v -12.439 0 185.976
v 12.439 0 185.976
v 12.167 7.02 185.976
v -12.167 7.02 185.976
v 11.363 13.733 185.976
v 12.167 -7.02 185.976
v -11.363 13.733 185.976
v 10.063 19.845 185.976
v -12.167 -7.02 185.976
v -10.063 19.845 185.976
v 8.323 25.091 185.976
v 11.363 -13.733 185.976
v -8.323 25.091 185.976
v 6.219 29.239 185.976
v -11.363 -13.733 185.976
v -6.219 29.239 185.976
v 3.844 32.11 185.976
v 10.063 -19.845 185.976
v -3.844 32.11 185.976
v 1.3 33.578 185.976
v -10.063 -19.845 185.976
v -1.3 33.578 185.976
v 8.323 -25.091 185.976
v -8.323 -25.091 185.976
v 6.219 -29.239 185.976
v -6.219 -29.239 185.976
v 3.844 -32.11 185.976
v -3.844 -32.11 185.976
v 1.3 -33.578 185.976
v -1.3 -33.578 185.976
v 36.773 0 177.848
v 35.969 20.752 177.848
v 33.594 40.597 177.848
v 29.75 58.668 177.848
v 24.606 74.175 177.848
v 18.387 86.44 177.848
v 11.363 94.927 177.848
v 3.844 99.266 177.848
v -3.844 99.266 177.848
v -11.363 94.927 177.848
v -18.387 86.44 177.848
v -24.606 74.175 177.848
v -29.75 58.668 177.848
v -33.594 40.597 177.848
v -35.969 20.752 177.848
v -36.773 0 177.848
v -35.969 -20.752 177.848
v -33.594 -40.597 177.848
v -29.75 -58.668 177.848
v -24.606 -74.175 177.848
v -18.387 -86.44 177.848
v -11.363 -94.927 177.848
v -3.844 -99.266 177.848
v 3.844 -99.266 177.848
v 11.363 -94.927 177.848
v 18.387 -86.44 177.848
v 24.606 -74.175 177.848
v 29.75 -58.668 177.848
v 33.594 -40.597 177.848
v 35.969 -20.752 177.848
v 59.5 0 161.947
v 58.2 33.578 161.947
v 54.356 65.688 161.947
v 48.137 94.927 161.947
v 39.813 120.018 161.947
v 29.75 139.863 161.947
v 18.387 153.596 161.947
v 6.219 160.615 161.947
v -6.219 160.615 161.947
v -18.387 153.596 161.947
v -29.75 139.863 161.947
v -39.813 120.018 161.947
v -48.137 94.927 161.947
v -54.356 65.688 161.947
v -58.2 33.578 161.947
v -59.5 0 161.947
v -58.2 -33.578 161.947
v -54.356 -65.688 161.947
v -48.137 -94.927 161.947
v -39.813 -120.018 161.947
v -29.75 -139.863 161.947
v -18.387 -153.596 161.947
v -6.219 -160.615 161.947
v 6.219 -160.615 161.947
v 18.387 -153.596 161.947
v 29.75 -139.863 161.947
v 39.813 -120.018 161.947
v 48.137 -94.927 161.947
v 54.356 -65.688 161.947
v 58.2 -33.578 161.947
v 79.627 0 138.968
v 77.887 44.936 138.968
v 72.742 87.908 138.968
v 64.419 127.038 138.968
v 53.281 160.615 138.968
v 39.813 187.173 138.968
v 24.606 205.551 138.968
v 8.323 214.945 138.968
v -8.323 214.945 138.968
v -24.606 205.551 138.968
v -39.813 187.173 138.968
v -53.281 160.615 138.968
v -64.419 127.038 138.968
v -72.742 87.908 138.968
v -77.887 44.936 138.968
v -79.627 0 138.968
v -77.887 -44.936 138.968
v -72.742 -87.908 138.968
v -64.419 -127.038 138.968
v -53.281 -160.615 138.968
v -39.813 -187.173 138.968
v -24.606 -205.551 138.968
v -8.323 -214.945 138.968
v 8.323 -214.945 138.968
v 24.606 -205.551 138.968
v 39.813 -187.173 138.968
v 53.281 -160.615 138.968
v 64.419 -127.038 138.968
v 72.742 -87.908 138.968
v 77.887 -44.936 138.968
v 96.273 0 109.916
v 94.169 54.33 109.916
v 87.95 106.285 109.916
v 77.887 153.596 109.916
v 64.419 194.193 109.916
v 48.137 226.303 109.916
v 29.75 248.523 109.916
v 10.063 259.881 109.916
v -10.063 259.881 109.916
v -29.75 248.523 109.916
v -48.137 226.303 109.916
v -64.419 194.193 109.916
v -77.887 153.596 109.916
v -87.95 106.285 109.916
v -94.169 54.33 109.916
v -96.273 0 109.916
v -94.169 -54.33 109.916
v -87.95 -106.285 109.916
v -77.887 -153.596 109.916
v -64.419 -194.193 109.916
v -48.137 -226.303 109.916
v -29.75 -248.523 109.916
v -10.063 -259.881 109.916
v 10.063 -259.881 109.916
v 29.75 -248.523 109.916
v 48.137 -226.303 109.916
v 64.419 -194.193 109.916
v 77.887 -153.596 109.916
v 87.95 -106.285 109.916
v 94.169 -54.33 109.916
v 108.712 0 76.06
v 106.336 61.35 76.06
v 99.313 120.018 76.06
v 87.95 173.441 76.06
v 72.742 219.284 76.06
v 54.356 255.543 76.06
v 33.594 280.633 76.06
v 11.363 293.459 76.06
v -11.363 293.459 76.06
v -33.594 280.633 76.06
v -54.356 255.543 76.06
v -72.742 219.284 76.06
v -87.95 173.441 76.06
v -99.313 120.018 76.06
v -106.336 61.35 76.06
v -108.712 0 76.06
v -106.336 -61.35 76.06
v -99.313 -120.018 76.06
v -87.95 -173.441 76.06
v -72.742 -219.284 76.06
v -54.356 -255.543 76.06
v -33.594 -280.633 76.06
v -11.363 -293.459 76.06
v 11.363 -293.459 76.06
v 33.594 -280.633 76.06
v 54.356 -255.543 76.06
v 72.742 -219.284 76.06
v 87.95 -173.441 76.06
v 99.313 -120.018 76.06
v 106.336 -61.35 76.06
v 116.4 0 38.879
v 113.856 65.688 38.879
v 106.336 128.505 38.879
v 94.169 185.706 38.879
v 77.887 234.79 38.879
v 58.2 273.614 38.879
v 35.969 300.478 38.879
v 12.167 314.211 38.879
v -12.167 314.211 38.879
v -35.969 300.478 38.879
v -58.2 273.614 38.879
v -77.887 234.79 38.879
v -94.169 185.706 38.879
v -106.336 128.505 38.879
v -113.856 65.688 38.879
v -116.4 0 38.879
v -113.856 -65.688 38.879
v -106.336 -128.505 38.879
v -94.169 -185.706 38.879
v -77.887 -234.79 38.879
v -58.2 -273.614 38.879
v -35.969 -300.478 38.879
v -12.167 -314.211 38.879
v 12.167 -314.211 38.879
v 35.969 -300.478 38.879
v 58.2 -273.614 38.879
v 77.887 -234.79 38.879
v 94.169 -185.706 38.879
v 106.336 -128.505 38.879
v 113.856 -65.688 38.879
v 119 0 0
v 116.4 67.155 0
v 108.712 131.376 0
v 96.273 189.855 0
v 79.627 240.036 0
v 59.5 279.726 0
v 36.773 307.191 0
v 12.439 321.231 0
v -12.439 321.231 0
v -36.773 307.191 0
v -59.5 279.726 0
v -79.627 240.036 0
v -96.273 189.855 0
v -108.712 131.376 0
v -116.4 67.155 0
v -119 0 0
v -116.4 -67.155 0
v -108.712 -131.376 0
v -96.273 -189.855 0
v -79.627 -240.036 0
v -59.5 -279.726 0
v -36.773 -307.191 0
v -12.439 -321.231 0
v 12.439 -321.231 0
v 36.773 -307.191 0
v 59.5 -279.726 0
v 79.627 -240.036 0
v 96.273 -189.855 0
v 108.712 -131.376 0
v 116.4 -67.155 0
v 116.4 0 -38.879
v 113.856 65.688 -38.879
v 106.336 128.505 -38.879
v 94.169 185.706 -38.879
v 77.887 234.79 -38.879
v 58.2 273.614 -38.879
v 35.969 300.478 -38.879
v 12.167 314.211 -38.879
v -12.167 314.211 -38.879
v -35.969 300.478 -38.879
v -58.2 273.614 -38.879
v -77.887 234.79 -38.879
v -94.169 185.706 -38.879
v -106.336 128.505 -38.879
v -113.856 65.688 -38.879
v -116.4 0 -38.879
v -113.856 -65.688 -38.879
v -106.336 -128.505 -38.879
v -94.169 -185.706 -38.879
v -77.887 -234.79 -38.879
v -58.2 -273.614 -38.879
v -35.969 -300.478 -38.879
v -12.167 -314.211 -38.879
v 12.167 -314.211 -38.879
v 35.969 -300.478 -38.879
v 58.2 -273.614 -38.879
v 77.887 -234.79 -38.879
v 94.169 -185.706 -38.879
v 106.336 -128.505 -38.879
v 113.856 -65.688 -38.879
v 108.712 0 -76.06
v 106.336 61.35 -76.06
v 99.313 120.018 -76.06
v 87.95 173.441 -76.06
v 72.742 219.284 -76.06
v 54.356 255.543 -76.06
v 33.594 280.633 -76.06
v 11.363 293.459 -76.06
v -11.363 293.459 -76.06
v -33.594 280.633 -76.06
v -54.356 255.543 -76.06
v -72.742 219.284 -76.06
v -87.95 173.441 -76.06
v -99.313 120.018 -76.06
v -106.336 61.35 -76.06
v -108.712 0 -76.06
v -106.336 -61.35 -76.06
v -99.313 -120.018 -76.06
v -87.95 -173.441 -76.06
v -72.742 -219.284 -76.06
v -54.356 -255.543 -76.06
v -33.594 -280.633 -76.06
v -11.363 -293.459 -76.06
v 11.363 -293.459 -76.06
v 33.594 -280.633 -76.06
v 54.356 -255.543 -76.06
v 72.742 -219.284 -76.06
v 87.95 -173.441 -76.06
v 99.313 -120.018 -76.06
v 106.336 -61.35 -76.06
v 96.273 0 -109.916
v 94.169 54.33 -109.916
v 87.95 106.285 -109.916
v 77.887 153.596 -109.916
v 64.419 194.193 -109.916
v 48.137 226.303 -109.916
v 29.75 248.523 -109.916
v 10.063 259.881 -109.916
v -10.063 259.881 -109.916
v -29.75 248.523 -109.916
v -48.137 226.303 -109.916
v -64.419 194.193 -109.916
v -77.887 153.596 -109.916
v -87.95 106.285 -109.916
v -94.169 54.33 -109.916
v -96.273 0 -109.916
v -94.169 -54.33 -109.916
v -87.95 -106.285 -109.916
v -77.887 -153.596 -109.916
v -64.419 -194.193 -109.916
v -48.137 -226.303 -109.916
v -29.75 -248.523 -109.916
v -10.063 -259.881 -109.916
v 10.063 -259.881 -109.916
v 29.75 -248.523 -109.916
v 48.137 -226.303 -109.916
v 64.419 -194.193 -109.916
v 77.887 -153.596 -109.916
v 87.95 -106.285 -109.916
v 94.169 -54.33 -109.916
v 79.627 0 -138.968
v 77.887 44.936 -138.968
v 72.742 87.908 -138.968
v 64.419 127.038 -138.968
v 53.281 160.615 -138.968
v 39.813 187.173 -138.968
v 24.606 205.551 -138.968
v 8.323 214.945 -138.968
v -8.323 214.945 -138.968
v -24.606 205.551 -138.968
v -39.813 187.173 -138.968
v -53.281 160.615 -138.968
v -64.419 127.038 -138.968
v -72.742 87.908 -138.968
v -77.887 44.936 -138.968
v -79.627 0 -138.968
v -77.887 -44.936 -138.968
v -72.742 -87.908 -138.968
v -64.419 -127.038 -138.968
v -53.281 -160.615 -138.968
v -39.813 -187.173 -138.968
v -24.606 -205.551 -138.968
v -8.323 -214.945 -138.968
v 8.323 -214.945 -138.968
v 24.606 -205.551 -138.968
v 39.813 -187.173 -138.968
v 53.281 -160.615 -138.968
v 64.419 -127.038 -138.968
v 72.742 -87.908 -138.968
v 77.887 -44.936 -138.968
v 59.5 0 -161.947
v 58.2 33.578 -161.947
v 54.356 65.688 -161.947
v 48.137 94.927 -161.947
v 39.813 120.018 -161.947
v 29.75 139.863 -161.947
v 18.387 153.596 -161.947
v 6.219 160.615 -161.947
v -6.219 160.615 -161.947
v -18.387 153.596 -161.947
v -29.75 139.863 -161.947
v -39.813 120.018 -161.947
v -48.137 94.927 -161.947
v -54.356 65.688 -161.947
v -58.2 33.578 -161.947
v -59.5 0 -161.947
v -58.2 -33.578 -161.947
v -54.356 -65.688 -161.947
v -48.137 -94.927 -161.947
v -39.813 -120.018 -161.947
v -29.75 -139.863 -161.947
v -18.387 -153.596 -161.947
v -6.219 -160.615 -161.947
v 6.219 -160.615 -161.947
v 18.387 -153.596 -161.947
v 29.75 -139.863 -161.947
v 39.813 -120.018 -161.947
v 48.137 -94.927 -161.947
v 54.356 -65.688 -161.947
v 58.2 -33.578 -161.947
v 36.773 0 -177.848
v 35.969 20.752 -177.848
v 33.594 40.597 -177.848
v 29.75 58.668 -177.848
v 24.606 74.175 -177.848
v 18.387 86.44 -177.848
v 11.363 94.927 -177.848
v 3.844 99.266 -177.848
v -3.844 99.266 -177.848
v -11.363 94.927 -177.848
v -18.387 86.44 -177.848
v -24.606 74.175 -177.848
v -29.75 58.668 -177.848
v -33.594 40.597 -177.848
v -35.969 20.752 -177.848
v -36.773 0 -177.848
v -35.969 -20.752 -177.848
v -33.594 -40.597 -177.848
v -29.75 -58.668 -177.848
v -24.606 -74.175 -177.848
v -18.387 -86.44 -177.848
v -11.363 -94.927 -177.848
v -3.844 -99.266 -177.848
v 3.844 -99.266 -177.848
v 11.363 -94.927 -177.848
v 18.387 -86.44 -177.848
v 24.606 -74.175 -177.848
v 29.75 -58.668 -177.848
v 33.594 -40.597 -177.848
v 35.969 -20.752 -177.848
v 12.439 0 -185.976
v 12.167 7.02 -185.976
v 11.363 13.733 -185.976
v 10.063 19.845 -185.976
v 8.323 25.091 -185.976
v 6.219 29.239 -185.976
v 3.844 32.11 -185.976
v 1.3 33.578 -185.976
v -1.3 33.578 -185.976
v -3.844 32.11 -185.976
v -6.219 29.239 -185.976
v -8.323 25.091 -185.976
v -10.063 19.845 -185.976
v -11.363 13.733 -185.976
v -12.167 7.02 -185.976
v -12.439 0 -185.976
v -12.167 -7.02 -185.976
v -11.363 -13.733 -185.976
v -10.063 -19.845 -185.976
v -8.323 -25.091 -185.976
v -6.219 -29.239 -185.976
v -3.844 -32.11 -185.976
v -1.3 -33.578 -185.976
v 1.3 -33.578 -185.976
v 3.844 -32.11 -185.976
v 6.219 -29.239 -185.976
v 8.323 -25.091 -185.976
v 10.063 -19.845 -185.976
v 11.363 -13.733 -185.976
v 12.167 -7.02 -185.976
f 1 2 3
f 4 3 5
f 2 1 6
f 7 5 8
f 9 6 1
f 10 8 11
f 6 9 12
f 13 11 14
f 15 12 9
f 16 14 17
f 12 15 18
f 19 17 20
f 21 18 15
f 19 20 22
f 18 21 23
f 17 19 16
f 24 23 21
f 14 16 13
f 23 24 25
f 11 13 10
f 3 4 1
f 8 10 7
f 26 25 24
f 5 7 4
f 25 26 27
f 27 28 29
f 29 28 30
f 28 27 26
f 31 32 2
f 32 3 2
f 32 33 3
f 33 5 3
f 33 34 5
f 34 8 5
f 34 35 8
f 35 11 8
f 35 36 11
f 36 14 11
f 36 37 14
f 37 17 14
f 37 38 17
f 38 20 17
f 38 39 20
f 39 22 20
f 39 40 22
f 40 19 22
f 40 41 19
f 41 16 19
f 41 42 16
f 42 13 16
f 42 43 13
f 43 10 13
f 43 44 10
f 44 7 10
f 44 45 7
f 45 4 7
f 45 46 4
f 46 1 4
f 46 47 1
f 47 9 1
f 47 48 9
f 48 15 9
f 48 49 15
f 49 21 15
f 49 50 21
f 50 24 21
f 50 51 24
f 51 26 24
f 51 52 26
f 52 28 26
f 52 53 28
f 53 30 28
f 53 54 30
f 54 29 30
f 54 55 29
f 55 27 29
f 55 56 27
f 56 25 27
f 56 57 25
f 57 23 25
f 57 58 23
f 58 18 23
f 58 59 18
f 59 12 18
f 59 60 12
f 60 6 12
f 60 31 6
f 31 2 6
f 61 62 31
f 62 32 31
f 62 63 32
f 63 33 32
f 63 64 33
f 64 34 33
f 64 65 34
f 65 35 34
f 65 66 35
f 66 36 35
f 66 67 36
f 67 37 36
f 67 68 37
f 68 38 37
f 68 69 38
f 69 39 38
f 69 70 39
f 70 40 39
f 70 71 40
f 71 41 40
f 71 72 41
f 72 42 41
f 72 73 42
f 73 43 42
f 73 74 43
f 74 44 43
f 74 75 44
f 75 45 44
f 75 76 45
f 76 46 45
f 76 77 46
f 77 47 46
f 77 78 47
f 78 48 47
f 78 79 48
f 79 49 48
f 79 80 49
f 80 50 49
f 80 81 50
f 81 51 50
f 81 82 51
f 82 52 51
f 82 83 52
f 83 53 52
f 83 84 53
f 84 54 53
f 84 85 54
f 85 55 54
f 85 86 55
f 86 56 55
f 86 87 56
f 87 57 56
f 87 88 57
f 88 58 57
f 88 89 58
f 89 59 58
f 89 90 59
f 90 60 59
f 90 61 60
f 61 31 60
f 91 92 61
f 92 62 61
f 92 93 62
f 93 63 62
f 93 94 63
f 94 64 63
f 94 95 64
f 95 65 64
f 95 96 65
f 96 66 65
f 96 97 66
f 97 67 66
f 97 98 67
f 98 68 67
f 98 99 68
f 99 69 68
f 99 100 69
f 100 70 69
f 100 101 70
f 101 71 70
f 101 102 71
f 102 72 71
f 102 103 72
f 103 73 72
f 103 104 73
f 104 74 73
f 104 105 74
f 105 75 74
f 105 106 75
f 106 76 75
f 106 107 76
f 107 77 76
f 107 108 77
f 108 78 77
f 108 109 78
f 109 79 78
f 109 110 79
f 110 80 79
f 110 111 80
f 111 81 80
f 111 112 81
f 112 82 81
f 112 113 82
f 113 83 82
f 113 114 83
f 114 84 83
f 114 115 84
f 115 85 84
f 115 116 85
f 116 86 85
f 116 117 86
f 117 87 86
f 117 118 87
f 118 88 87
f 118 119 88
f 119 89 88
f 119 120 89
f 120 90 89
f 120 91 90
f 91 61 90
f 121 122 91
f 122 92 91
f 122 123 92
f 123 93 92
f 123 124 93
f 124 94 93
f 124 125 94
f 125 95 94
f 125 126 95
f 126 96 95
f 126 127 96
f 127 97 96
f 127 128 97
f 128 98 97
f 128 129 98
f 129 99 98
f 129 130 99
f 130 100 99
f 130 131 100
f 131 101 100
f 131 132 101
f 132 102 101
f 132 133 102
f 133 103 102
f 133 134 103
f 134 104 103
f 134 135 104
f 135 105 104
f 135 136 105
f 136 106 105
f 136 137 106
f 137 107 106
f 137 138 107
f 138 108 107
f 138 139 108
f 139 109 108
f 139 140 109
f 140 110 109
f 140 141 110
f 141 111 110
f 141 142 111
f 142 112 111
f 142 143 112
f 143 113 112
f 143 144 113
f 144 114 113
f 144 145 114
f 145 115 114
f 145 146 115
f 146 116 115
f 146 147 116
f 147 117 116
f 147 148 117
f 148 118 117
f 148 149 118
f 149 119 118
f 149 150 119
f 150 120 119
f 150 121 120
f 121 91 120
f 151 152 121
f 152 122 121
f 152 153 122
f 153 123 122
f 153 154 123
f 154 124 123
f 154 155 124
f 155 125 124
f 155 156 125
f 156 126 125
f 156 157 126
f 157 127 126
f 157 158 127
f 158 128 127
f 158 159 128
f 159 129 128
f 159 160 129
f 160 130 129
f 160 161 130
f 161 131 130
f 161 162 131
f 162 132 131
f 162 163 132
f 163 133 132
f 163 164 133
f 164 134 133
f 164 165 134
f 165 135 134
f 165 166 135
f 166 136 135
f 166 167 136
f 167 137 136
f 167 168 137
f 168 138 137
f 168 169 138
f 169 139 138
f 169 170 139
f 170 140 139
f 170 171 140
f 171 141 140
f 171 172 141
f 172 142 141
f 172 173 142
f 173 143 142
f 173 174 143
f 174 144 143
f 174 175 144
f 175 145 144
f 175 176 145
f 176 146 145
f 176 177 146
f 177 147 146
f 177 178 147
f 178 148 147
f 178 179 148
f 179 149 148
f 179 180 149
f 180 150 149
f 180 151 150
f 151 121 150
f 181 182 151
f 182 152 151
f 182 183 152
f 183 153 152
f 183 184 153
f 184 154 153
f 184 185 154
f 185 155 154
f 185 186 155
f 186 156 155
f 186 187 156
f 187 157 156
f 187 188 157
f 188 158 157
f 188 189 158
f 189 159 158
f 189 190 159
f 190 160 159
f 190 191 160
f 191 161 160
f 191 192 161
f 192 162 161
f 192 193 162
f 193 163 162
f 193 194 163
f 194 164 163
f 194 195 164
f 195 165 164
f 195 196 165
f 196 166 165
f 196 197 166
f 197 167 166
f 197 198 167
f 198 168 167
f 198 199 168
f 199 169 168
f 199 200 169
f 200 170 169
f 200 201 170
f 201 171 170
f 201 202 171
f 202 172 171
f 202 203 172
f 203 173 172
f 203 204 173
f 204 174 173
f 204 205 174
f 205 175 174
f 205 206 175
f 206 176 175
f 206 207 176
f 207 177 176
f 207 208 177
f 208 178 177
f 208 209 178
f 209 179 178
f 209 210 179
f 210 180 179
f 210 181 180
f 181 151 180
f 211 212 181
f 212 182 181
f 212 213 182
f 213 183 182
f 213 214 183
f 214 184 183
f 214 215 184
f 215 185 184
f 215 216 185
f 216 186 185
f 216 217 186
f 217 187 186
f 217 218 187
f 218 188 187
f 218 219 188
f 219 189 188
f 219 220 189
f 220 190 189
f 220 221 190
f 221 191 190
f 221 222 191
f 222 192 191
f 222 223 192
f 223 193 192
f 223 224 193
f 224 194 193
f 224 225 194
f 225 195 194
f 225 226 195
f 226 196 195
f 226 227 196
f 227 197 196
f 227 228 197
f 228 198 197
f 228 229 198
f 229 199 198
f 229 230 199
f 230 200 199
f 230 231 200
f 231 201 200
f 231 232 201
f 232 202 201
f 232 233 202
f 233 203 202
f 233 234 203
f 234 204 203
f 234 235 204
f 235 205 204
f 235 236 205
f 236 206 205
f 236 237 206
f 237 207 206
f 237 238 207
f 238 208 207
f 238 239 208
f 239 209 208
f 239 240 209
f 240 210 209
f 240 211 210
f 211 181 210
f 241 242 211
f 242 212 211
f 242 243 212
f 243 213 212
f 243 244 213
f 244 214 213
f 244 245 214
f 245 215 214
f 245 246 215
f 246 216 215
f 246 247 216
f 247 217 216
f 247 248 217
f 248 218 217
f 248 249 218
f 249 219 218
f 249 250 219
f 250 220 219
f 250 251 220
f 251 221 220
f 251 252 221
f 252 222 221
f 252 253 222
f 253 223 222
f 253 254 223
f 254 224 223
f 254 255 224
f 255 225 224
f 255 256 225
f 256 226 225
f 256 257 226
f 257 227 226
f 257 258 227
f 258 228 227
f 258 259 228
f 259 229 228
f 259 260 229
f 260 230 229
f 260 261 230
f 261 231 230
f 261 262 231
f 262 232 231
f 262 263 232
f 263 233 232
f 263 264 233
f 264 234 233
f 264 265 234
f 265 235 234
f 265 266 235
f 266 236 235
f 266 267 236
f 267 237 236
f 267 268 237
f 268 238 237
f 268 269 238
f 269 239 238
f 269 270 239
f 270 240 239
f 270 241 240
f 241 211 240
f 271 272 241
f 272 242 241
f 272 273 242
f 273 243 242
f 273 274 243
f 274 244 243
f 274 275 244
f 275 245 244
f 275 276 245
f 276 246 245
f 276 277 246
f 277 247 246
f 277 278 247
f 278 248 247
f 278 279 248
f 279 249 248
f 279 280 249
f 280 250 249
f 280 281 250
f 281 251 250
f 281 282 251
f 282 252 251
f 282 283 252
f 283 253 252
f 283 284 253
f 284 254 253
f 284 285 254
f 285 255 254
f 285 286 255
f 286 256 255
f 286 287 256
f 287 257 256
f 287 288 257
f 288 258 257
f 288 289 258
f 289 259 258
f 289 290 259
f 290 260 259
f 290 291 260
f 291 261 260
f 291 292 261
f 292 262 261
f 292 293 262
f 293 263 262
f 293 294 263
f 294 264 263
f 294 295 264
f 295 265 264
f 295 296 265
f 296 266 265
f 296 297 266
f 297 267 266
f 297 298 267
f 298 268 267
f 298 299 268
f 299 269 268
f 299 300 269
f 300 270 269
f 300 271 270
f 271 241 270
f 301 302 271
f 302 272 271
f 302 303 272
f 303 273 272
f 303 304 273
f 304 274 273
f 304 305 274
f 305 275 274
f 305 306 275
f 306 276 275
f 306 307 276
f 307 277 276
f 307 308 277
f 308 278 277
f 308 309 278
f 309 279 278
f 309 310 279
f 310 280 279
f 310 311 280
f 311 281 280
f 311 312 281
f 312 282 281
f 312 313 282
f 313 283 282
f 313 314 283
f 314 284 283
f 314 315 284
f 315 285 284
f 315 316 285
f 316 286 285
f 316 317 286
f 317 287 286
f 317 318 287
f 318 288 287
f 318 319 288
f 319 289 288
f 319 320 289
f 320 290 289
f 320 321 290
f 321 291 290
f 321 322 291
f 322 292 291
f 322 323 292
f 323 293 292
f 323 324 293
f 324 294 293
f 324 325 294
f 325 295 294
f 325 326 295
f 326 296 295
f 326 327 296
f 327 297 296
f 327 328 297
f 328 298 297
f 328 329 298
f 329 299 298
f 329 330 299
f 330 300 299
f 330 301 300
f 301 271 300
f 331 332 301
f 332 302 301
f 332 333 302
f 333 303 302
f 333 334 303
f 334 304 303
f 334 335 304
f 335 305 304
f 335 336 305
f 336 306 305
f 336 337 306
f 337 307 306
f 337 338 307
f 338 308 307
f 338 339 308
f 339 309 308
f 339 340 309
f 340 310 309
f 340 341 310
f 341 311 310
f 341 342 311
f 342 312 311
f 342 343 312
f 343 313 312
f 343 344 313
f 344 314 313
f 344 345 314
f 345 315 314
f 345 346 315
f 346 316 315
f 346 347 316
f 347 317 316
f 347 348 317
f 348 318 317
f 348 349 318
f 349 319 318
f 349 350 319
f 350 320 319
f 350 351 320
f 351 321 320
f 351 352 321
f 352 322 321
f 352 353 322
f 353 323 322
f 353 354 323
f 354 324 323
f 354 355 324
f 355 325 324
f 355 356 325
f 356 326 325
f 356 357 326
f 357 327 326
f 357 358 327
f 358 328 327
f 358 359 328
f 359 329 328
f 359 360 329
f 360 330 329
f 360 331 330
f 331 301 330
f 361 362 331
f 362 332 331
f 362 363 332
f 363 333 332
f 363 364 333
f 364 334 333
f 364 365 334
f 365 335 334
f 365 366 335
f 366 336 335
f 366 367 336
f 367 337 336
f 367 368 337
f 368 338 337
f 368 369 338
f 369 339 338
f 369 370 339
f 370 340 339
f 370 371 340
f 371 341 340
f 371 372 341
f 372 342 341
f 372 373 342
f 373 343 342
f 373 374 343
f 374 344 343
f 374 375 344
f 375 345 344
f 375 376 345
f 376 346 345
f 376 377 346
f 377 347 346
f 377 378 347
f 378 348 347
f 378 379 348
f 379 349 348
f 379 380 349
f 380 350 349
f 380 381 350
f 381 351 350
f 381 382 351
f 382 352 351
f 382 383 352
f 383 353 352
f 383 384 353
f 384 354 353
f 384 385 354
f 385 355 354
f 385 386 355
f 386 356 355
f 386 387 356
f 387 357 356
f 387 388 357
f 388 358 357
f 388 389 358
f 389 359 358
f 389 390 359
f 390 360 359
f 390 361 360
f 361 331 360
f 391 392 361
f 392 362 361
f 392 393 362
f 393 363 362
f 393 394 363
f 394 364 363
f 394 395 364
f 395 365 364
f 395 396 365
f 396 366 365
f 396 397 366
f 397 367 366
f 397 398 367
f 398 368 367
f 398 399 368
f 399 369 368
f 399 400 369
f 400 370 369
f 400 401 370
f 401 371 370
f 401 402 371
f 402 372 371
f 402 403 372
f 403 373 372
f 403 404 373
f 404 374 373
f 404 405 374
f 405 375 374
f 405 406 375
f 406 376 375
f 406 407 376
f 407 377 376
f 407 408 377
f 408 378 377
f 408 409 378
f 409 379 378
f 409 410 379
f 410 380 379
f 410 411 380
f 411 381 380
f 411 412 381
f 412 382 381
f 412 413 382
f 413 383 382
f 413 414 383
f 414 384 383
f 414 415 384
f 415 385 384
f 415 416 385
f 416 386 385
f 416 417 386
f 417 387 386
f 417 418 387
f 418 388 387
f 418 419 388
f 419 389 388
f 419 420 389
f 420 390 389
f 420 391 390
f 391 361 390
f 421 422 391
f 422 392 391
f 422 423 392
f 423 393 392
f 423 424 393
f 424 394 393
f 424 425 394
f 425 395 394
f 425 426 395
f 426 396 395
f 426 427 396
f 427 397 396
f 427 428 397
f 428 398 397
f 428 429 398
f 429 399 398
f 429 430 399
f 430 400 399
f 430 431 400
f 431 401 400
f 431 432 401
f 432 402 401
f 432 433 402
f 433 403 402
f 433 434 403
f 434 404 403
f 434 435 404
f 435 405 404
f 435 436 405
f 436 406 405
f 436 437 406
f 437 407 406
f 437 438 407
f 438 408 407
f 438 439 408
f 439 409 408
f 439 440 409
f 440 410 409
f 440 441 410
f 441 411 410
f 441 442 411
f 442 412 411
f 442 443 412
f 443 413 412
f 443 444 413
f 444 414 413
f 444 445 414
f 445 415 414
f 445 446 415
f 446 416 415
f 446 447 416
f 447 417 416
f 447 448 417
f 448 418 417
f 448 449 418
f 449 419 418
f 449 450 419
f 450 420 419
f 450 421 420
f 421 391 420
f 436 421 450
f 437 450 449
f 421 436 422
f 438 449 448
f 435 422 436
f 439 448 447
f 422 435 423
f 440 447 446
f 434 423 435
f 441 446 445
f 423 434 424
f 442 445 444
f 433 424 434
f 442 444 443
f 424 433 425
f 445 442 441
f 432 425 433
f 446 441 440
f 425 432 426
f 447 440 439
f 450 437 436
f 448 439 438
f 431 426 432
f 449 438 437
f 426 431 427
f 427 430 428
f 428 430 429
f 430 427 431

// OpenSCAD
// Generated by SolidPython 1.0.1 on 2020-07-29 00:46:48


scale(v = [7, 19, 11]) {
	sphere(r = 17);
}
/***********************************************
*********      SolidPython code:      **********
************************************************
 
# import packages: SolidPython
from solid import *
from solid.utils import *
from itertools import chain, combinations, permutations


class Resize:

    def __init__(self, scad_file):
        self.scad_file = scad_file
        #self.scad_file = import_scad(scad_file)
        # cone/cylinder param:
        self.r1 = 0
        self.r2 = 0
        self.h = 0
        # rectangular prism param:
        self.w = 0
        self.l = 0
        # ellipse param:
        self.r = 0

    # import OpenScad code (file name corresponds to shape)


    # classify shape + parameters
    def assign(self, param1, param2, param3):
        if self.scad_file == 'cone.scad':
            self.r1 = param1
            self.r2 = param2
            self.h = param3
        elif self.scad_file == 'cylinder.scad':
            self.r1 = param1
            self.r2 = param2
            self.h = param3
        elif self.scad_file == 'rectangularPrism.scad':
            self.h = param1
            self.l = param2
            self.w = param3
        else:
            self.r = param1
            self.h = param2

    # resize parameters
    def iterate(self):
        x = range(3, 20, 2)
        i = 1
        if self.scad_file == 'cone.scad':
            tempList = list(permutations(x, 2))
            for temp in tempList:
                param1 = temp[0]
                param2 = temp[1]
                filepath = 'produced_scad_files/' + 'cone' + str(param1) + '_' + str(param2) + '_' + '.scad'
                scad_render_to_file(cylinder(h=param1, r1=param2, r2=0), filepath)

        elif self.scad_file == 'cylinder.scad':
            tempList = list(permutations(x, 3))
            for temp in tempList:
                param1 = temp[0]
                param2 = temp[1]
                filepath = 'produced_scad_files/' + 'cylinder' + str(param1) + '_' + str(param2) + '_' + '.scad'
                scad_render_to_file(cylinder(h=param1, r1=param2, r2=param2), filepath)

        elif self.scad_file == 'rectangularPrism.scad':
            tempList = list(permutations(x, 3))
            for temp in tempList:
                param1 = temp[0]
                param2 = temp[1]
                param3 = temp[2]
                filepath = 'produced_scad_files/' + 'rectangularPrism' + str(param1) + '_' + str(param2) + '_' + str(
                    param3) + '.scad'
                scad_render_to_file(cube(size=(param1, param2, param3)), filepath)

        elif self.scad_file == 'ellipse.scad':
            tempList = list(permutations(x, 4))
            for temp in tempList:
                param1 = temp[0]
                param2 = temp[1]
                param3 = temp[2]
                param4 = temp[3]
                filepath = 'produced_scad_files/' + 'ellipse' + str(param1) + '_' + str(param2) + '_' + str(param3) + '_' + str(param4) + '.scad'
                scad_render_to_file(scale([param1, param2, param3])(sphere(r=param4)), filepath)

    def render_to_scadfile(self):
        scad_render_to_file(scad, 'example.scad') 
 
************************************************/
